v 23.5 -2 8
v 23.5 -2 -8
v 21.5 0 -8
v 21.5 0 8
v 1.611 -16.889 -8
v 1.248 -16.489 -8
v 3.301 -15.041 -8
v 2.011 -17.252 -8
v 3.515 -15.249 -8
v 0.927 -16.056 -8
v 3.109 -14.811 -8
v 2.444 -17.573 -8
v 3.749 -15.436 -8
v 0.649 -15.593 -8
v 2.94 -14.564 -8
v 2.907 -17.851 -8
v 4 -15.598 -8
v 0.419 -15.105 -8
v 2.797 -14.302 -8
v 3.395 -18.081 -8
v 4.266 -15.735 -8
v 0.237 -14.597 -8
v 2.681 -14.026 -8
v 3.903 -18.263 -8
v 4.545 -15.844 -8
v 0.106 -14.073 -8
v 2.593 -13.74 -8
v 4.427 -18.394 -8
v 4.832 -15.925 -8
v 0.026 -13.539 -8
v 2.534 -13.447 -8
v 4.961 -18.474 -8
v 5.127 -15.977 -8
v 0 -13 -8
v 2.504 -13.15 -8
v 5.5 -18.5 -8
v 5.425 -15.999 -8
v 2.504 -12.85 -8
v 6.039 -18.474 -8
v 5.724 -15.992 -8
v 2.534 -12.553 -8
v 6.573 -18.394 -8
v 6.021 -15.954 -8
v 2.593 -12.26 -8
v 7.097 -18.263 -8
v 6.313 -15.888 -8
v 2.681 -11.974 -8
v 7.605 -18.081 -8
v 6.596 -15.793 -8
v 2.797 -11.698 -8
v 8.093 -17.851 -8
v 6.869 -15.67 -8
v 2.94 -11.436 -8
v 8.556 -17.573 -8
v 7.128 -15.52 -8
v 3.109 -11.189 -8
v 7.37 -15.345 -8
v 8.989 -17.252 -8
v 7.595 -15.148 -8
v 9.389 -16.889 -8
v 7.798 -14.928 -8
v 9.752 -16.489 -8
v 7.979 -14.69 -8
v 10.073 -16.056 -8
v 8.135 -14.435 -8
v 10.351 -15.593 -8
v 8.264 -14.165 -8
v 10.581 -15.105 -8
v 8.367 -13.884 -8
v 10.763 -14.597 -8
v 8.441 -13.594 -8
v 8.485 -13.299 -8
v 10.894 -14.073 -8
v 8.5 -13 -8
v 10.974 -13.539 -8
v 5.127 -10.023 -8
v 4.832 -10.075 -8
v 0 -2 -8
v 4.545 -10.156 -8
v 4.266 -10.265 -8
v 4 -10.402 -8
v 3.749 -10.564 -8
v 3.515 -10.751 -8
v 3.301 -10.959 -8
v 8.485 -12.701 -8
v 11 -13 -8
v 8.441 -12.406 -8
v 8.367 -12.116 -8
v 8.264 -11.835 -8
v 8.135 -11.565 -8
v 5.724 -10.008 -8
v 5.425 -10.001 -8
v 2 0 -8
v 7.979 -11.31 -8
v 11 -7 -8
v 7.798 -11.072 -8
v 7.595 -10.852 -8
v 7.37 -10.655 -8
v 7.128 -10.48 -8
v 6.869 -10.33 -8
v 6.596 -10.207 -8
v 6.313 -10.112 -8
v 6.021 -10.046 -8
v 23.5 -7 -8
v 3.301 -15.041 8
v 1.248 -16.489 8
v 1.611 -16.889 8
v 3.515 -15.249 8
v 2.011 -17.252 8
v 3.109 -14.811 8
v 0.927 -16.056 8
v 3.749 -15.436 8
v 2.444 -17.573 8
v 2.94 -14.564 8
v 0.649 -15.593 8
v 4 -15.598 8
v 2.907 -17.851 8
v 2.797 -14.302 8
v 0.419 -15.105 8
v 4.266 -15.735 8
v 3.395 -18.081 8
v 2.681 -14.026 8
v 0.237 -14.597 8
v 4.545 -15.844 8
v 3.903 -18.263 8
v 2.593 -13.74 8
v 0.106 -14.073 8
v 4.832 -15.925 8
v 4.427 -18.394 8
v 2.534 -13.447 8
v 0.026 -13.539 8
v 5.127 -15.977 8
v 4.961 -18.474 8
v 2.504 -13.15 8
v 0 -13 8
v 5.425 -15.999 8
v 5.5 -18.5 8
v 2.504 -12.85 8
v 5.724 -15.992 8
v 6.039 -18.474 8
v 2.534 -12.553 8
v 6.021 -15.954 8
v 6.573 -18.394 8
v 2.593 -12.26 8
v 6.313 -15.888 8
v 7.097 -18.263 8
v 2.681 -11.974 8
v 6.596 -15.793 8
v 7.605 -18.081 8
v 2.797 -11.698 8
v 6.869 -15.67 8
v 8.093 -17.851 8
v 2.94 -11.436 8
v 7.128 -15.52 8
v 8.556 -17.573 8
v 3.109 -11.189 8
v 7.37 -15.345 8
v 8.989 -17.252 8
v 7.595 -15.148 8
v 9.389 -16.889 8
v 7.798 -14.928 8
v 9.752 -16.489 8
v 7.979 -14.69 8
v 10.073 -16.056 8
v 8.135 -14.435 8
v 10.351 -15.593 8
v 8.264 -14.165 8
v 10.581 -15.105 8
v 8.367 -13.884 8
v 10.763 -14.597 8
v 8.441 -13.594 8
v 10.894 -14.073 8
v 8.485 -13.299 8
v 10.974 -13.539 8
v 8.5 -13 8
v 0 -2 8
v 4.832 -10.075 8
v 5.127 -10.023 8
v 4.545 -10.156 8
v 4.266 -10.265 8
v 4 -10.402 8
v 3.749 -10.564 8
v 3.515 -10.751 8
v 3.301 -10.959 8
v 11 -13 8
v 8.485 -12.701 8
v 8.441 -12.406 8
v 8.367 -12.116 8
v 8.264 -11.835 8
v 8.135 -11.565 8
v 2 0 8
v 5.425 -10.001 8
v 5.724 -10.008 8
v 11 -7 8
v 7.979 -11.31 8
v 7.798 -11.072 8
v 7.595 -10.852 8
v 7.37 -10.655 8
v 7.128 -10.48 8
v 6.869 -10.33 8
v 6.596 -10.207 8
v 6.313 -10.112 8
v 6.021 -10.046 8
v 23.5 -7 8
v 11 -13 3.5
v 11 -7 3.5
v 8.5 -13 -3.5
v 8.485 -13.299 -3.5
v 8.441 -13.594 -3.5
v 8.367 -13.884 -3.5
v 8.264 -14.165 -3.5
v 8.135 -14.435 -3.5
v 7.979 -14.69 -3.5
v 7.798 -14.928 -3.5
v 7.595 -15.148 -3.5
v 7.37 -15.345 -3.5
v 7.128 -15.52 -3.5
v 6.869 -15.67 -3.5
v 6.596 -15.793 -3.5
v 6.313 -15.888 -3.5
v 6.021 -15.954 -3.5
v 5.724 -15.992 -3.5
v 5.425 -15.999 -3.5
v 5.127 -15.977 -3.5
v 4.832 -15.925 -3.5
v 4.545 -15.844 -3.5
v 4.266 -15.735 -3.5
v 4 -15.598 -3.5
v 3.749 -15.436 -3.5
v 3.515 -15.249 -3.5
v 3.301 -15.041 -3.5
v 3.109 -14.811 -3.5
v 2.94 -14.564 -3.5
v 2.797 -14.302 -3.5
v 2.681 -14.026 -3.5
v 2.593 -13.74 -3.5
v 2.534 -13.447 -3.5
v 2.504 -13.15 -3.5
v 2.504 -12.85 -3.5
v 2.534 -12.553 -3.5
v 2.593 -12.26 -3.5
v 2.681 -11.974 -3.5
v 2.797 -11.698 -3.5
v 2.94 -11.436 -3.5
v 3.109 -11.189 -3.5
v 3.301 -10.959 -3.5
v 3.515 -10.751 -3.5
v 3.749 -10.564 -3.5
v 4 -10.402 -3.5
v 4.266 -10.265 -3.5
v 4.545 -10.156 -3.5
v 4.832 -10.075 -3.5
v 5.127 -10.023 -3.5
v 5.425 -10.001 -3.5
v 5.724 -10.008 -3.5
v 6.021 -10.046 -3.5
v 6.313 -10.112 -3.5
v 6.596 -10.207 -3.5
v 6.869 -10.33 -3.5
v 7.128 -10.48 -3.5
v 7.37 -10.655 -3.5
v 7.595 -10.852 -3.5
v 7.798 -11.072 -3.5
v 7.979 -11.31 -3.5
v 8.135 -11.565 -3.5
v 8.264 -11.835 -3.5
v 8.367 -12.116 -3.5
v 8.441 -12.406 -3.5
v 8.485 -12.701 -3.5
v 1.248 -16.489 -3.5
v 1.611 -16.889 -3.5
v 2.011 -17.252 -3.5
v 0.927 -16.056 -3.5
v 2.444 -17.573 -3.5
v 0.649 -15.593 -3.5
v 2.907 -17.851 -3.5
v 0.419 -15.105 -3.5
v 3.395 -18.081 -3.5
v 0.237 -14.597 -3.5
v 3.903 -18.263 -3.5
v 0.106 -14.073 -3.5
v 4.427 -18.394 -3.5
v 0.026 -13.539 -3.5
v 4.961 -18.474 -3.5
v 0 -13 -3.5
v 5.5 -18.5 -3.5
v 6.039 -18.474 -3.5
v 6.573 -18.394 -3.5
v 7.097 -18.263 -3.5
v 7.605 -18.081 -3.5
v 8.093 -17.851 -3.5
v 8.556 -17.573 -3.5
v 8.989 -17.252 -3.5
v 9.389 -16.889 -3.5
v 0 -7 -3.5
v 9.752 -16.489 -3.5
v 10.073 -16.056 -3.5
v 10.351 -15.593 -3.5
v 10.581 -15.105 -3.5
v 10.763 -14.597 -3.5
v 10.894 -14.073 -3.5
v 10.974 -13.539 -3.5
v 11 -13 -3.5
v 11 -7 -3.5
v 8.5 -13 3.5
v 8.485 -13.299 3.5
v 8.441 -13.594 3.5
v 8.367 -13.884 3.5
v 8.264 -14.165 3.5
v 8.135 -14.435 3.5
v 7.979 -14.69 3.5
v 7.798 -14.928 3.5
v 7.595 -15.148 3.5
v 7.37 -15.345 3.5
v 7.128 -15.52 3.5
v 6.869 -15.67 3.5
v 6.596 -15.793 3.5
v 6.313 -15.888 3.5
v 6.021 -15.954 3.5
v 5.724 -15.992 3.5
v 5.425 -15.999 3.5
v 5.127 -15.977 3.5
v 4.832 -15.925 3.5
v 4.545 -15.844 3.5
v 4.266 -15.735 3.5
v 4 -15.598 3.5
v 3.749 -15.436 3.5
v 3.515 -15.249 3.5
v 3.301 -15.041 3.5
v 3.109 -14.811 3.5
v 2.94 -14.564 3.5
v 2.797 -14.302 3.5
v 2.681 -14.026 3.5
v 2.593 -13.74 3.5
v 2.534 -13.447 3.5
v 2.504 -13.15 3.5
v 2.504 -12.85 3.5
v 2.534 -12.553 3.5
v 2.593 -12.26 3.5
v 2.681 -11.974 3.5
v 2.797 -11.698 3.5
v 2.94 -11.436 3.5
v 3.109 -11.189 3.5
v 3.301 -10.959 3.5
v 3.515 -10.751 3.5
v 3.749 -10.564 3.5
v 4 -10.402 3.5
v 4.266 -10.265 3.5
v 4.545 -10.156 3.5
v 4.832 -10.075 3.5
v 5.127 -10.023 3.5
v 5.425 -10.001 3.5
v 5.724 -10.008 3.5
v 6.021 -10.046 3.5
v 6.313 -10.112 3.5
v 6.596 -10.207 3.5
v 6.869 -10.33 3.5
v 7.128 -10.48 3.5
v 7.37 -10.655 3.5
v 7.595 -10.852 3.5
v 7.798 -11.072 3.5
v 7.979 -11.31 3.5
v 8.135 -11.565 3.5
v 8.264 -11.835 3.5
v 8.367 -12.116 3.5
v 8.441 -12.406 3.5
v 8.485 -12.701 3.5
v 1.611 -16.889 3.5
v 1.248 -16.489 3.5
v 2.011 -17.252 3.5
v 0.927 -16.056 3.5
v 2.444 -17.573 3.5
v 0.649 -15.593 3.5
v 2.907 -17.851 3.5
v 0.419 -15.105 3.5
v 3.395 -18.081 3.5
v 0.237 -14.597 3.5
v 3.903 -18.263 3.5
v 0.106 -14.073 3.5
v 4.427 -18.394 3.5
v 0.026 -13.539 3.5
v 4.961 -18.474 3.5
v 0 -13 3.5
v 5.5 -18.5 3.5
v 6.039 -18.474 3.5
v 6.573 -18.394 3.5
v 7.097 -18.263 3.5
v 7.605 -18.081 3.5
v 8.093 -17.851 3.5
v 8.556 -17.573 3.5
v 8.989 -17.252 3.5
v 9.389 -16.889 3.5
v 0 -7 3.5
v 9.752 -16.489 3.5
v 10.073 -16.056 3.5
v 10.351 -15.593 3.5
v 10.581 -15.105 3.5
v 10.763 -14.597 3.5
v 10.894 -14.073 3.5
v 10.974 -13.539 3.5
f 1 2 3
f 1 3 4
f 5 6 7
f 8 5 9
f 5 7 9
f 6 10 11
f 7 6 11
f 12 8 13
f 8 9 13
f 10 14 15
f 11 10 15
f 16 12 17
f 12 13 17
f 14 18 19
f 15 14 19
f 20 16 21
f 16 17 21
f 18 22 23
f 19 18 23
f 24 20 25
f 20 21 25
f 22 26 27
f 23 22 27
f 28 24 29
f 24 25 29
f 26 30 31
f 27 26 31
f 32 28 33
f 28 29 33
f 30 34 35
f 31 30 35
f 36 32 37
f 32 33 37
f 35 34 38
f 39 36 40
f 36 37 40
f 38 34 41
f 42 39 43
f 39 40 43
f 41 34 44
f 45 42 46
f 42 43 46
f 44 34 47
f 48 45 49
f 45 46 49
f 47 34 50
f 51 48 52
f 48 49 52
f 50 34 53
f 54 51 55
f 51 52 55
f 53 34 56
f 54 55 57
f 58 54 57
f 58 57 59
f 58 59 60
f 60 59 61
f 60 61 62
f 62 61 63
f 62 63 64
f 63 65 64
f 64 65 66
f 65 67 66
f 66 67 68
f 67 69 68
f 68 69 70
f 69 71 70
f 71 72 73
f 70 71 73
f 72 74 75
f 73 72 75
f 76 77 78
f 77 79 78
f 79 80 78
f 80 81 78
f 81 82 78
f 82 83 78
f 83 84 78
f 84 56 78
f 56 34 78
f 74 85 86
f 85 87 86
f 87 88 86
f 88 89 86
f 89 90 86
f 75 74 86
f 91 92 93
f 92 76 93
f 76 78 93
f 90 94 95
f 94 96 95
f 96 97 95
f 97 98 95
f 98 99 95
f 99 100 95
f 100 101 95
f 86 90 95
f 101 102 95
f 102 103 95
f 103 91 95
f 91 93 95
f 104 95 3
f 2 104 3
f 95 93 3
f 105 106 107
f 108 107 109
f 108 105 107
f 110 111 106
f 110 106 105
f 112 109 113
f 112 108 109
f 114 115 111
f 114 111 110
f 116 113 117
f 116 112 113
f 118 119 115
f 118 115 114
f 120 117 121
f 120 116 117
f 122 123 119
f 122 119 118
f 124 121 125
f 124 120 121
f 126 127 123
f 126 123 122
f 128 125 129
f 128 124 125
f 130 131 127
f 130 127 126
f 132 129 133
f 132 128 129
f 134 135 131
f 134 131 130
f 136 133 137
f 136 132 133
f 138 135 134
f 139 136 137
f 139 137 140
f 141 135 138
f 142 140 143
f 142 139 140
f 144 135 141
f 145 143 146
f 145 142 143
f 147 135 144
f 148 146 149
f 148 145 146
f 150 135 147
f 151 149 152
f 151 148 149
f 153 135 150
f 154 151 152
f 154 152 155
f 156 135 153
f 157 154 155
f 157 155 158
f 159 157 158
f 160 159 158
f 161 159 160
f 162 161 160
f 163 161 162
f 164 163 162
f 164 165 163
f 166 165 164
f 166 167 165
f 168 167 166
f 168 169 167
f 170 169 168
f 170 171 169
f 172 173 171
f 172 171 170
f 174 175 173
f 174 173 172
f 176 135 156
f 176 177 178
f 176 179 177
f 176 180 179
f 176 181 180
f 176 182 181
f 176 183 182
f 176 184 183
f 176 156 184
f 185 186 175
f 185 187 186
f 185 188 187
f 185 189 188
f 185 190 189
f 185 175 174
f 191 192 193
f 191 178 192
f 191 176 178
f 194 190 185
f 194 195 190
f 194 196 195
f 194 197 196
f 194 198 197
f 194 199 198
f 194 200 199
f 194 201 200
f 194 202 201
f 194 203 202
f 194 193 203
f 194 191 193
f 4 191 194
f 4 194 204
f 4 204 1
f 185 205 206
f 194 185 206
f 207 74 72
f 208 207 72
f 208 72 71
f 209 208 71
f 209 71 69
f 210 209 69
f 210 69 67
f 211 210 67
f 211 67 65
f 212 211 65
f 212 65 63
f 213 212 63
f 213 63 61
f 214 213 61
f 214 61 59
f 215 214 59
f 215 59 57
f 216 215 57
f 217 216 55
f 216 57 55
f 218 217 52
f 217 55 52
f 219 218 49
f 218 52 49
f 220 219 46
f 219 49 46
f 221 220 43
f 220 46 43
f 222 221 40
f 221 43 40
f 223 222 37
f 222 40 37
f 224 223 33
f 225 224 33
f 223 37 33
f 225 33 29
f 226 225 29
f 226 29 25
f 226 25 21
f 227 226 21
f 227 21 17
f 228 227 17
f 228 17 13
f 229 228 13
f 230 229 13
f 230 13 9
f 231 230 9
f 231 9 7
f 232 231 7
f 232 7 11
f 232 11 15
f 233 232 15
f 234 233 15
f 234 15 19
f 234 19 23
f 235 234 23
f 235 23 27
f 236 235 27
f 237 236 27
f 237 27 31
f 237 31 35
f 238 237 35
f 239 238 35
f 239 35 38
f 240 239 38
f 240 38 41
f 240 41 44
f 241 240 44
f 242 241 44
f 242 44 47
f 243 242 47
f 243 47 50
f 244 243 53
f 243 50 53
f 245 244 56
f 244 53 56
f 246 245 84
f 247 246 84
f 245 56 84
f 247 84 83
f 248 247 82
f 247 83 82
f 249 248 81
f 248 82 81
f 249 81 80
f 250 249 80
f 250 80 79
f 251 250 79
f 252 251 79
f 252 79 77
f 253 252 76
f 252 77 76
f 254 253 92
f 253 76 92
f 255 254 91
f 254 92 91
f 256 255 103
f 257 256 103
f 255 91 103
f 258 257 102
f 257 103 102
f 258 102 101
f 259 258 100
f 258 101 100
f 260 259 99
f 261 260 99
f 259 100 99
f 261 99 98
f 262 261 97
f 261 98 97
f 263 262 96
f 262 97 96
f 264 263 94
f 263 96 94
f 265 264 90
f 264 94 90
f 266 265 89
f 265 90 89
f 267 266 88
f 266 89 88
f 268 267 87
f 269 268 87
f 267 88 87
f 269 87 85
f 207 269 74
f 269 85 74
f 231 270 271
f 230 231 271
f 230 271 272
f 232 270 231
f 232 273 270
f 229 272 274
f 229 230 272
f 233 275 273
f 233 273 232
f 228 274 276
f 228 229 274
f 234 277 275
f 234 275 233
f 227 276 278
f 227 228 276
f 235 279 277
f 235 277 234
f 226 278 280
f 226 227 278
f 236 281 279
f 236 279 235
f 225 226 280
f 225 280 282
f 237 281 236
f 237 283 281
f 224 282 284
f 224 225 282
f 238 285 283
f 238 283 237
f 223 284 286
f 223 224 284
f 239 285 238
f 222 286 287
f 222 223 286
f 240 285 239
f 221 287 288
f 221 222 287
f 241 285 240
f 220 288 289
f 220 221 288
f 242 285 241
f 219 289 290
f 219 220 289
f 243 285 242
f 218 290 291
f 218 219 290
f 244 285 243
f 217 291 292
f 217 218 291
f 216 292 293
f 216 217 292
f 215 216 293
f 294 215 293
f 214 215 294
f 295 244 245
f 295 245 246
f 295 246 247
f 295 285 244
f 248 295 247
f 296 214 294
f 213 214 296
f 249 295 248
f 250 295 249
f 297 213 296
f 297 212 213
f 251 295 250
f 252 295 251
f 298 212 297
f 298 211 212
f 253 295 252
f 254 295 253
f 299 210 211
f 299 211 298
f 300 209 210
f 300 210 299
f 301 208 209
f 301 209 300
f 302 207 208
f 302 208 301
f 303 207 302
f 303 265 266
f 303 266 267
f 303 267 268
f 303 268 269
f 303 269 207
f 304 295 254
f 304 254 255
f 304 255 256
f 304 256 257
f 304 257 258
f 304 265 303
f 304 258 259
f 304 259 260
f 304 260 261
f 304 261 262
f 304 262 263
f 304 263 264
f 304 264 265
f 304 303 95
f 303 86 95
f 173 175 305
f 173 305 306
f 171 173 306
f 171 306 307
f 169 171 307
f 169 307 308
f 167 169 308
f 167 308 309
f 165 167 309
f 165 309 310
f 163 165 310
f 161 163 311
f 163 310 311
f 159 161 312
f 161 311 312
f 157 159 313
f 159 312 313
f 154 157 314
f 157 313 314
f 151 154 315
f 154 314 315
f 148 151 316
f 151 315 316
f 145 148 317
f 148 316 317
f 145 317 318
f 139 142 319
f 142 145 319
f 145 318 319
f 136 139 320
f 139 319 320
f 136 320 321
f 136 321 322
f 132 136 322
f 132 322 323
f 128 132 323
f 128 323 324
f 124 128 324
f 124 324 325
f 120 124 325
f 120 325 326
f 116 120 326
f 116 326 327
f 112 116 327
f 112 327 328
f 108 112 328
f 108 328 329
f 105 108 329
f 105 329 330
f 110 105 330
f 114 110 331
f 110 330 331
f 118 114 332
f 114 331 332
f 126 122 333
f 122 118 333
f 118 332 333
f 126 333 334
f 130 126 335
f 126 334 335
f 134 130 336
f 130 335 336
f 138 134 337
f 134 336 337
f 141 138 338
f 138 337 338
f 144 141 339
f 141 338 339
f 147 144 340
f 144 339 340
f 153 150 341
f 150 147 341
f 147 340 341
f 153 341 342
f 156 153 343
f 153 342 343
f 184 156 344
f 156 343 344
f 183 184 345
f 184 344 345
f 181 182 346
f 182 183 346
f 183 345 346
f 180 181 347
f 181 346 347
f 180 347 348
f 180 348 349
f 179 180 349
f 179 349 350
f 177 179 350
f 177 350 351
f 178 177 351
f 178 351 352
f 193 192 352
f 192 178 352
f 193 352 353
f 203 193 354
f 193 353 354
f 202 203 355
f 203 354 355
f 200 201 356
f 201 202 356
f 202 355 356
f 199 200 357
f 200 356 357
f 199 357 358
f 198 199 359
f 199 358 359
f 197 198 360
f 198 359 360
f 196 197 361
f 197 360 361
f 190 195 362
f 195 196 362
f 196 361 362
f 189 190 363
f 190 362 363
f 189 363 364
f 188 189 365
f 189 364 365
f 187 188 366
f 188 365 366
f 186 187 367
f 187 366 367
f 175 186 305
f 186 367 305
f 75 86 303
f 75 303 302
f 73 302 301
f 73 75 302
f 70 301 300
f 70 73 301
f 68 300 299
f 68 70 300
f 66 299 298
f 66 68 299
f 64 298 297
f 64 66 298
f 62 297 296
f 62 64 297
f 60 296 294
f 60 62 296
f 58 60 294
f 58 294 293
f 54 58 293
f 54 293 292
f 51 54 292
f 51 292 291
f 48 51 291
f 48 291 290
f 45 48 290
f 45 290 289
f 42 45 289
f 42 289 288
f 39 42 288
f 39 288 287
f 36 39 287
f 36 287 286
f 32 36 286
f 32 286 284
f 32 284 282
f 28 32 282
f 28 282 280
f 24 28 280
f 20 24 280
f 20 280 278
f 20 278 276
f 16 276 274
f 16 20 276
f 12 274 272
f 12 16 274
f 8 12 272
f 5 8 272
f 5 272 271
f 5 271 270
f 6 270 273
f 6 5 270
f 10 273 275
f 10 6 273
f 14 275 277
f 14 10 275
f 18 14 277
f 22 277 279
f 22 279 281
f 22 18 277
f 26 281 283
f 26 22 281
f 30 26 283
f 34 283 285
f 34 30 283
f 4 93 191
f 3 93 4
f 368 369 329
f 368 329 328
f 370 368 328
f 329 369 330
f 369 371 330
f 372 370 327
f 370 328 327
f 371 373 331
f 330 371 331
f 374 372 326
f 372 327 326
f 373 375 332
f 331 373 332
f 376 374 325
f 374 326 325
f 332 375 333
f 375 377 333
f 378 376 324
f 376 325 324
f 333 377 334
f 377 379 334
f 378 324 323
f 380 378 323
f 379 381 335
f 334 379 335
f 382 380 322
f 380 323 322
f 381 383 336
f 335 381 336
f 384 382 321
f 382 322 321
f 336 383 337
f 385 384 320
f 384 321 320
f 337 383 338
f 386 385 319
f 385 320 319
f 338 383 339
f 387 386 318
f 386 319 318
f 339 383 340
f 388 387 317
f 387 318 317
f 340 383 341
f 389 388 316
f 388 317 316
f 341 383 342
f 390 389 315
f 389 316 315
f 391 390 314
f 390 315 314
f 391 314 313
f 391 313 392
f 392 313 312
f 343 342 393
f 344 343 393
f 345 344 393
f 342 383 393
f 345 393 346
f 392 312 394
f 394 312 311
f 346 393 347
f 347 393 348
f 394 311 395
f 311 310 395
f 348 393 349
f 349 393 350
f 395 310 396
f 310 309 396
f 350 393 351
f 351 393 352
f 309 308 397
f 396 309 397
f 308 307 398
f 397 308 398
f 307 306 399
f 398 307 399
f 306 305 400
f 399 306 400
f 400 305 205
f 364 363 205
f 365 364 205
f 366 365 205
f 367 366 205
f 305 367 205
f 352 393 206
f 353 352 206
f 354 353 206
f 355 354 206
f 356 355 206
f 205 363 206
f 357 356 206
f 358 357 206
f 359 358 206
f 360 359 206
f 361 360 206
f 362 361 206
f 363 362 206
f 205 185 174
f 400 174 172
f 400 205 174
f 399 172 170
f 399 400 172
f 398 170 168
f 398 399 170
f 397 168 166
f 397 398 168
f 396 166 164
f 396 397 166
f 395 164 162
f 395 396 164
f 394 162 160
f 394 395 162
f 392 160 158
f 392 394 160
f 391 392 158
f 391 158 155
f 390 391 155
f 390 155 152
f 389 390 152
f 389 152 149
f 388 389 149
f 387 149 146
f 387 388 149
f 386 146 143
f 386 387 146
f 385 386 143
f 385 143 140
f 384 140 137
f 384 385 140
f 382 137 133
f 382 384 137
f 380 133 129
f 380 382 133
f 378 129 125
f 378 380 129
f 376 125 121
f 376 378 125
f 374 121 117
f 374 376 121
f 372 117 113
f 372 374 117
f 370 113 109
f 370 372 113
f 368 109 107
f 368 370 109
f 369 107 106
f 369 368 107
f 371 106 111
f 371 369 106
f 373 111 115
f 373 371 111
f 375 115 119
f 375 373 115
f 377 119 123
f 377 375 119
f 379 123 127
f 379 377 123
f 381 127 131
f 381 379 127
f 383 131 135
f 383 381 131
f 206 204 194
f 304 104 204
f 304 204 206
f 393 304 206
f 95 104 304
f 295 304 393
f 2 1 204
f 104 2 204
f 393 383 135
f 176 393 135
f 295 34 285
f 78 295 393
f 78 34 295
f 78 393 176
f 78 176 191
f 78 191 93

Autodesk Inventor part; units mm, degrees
ref_plane "YZ Plane" through (0, 0, 0) normal (1, 0, 0) x (0, 1, 0)
ref_plane "XZ Plane" through (0, 0, 0) normal (0, 1, 0) x (-1, 0, 0)
ref_plane "XY Plane" through (0, 0, 0) normal (0, 0, 1) x (1, 0, 0)
sketch "스케치1" plane through (0, 0, 0) normal (0, 0, 1) x (1, 0, 0)
  line L0 (0, 0) -> (23.5, 0)
  line L1 (23.5, 0) -> (23.5, -7)
  line L2 (23.5, -7) -> (11, -7)
  line L3 (0, -7) -> (0, 0)
  circle A0 centre (5.5, -13) radius 3
  arc A1 (0, -13) -> (11, -13) centre (5.5, -13) ccw
  line L4 (11, -13) -> (11, -7)
  line L5 (0, -13) -> (0, -7)
  dimension "d0" = 23.5
  dimension "d1" = 7
  dimension "d2" = 6
  dimension "d3" = 6
  dimension "d4" = 5.5
  dimension "d5" = 11
  dimension "d6" = 23.5
extrude "돌출1" add sketch "스케치1" along normal mid plane 16
ref_plane "작업 평면1" through (0, 0, 0) normal (0, 0, 1) x (1, 0, 0)
sketch "스케치2" plane through (0, 0, 0) normal (0, 0, 1) x (1, 0, 0)
  line L0 (-2.9119, -7) -> (15.7404, -7)
  line L1 (15.7404, -7) -> (15.7404, -20.77)
  line L2 (15.7404, -20.77) -> (-2.9119, -20.77)
  line L3 (-2.9119, -20.77) -> (-2.9119, -7)
  line L4 (0, 0) -> (23.5, 0) projected
  dimension "d9" = 7
extrude "돌출2" cut sketch "스케치2" along normal mid plane 7
chamfer "모따기1" distance 2 angle 45 2 edges at (23.5, 0, 0) (0, 0, 0)
properties part number "2번부품"
